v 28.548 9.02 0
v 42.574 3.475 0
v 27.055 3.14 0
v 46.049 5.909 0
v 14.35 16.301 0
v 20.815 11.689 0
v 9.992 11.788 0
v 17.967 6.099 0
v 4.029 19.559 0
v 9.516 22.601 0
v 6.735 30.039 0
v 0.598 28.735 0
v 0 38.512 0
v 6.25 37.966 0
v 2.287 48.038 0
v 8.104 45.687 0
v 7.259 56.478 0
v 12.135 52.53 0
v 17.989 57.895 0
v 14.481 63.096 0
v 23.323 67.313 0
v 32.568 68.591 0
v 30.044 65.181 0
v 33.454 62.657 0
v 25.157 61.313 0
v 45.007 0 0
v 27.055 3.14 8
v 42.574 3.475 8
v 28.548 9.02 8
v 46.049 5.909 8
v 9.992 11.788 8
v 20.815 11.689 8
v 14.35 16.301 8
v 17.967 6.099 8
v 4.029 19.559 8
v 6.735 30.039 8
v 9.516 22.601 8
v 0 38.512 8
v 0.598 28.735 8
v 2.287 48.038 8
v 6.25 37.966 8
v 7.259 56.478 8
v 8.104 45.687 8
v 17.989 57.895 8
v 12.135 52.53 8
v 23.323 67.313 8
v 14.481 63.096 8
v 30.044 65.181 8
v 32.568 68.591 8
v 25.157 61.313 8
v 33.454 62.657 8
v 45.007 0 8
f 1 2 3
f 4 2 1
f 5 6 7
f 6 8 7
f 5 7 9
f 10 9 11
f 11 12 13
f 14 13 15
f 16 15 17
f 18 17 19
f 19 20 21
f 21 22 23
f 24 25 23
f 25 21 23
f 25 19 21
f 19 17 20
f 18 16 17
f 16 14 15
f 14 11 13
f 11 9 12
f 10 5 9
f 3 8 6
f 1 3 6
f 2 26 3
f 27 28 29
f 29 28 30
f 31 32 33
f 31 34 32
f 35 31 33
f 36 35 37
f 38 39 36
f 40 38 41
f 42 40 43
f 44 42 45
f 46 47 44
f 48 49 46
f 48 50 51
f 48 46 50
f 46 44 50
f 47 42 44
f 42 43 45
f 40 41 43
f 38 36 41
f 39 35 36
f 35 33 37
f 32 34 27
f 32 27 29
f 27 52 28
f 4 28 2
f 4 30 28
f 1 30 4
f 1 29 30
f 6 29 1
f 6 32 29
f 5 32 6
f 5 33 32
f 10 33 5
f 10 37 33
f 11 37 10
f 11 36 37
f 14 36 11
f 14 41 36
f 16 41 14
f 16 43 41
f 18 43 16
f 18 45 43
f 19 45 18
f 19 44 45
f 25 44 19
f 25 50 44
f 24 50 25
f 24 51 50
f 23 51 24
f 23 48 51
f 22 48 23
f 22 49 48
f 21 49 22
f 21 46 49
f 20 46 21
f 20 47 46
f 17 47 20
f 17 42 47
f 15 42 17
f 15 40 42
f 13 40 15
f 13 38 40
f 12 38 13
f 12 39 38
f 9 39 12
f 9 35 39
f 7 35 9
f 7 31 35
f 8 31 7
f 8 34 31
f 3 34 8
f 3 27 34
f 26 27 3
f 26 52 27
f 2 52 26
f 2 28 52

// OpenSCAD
$fn = 32;

// ----------------------------------------------------------------------
// Hook plate: curl radius 30 mm over 170 degrees, 6 mm thick band
// ----------------------------------------------------------------------

// --- parameters (mm) ---
profile_height = 8;       // extrusion height
profile_points = 26;      // points of the closed outline

profile = [[30.044, 65.181], [32.568, 68.591], [23.323, 67.313], [14.481, 63.096], [7.259, 56.478], [2.287, 48.038], [0, 38.512], [0.598, 28.735], [4.029, 19.559], [9.992, 11.788], [17.967, 6.099], [27.055, 3.14], [45.007, 0], [42.574, 3.475], [46.049, 5.909], [28.548, 9.02], [20.815, 11.689], [14.35, 16.301], [9.516, 22.601], [6.735, 30.039], [6.25, 37.966], [8.104, 45.687], [12.135, 52.53], [17.989, 57.895], [25.157, 61.313], [33.454, 62.657]];  // single closed polygon, 26 points, counter clockwise

// --- the one profile operation ---
linear_extrude(height = profile_height) polygon(points = profile);
